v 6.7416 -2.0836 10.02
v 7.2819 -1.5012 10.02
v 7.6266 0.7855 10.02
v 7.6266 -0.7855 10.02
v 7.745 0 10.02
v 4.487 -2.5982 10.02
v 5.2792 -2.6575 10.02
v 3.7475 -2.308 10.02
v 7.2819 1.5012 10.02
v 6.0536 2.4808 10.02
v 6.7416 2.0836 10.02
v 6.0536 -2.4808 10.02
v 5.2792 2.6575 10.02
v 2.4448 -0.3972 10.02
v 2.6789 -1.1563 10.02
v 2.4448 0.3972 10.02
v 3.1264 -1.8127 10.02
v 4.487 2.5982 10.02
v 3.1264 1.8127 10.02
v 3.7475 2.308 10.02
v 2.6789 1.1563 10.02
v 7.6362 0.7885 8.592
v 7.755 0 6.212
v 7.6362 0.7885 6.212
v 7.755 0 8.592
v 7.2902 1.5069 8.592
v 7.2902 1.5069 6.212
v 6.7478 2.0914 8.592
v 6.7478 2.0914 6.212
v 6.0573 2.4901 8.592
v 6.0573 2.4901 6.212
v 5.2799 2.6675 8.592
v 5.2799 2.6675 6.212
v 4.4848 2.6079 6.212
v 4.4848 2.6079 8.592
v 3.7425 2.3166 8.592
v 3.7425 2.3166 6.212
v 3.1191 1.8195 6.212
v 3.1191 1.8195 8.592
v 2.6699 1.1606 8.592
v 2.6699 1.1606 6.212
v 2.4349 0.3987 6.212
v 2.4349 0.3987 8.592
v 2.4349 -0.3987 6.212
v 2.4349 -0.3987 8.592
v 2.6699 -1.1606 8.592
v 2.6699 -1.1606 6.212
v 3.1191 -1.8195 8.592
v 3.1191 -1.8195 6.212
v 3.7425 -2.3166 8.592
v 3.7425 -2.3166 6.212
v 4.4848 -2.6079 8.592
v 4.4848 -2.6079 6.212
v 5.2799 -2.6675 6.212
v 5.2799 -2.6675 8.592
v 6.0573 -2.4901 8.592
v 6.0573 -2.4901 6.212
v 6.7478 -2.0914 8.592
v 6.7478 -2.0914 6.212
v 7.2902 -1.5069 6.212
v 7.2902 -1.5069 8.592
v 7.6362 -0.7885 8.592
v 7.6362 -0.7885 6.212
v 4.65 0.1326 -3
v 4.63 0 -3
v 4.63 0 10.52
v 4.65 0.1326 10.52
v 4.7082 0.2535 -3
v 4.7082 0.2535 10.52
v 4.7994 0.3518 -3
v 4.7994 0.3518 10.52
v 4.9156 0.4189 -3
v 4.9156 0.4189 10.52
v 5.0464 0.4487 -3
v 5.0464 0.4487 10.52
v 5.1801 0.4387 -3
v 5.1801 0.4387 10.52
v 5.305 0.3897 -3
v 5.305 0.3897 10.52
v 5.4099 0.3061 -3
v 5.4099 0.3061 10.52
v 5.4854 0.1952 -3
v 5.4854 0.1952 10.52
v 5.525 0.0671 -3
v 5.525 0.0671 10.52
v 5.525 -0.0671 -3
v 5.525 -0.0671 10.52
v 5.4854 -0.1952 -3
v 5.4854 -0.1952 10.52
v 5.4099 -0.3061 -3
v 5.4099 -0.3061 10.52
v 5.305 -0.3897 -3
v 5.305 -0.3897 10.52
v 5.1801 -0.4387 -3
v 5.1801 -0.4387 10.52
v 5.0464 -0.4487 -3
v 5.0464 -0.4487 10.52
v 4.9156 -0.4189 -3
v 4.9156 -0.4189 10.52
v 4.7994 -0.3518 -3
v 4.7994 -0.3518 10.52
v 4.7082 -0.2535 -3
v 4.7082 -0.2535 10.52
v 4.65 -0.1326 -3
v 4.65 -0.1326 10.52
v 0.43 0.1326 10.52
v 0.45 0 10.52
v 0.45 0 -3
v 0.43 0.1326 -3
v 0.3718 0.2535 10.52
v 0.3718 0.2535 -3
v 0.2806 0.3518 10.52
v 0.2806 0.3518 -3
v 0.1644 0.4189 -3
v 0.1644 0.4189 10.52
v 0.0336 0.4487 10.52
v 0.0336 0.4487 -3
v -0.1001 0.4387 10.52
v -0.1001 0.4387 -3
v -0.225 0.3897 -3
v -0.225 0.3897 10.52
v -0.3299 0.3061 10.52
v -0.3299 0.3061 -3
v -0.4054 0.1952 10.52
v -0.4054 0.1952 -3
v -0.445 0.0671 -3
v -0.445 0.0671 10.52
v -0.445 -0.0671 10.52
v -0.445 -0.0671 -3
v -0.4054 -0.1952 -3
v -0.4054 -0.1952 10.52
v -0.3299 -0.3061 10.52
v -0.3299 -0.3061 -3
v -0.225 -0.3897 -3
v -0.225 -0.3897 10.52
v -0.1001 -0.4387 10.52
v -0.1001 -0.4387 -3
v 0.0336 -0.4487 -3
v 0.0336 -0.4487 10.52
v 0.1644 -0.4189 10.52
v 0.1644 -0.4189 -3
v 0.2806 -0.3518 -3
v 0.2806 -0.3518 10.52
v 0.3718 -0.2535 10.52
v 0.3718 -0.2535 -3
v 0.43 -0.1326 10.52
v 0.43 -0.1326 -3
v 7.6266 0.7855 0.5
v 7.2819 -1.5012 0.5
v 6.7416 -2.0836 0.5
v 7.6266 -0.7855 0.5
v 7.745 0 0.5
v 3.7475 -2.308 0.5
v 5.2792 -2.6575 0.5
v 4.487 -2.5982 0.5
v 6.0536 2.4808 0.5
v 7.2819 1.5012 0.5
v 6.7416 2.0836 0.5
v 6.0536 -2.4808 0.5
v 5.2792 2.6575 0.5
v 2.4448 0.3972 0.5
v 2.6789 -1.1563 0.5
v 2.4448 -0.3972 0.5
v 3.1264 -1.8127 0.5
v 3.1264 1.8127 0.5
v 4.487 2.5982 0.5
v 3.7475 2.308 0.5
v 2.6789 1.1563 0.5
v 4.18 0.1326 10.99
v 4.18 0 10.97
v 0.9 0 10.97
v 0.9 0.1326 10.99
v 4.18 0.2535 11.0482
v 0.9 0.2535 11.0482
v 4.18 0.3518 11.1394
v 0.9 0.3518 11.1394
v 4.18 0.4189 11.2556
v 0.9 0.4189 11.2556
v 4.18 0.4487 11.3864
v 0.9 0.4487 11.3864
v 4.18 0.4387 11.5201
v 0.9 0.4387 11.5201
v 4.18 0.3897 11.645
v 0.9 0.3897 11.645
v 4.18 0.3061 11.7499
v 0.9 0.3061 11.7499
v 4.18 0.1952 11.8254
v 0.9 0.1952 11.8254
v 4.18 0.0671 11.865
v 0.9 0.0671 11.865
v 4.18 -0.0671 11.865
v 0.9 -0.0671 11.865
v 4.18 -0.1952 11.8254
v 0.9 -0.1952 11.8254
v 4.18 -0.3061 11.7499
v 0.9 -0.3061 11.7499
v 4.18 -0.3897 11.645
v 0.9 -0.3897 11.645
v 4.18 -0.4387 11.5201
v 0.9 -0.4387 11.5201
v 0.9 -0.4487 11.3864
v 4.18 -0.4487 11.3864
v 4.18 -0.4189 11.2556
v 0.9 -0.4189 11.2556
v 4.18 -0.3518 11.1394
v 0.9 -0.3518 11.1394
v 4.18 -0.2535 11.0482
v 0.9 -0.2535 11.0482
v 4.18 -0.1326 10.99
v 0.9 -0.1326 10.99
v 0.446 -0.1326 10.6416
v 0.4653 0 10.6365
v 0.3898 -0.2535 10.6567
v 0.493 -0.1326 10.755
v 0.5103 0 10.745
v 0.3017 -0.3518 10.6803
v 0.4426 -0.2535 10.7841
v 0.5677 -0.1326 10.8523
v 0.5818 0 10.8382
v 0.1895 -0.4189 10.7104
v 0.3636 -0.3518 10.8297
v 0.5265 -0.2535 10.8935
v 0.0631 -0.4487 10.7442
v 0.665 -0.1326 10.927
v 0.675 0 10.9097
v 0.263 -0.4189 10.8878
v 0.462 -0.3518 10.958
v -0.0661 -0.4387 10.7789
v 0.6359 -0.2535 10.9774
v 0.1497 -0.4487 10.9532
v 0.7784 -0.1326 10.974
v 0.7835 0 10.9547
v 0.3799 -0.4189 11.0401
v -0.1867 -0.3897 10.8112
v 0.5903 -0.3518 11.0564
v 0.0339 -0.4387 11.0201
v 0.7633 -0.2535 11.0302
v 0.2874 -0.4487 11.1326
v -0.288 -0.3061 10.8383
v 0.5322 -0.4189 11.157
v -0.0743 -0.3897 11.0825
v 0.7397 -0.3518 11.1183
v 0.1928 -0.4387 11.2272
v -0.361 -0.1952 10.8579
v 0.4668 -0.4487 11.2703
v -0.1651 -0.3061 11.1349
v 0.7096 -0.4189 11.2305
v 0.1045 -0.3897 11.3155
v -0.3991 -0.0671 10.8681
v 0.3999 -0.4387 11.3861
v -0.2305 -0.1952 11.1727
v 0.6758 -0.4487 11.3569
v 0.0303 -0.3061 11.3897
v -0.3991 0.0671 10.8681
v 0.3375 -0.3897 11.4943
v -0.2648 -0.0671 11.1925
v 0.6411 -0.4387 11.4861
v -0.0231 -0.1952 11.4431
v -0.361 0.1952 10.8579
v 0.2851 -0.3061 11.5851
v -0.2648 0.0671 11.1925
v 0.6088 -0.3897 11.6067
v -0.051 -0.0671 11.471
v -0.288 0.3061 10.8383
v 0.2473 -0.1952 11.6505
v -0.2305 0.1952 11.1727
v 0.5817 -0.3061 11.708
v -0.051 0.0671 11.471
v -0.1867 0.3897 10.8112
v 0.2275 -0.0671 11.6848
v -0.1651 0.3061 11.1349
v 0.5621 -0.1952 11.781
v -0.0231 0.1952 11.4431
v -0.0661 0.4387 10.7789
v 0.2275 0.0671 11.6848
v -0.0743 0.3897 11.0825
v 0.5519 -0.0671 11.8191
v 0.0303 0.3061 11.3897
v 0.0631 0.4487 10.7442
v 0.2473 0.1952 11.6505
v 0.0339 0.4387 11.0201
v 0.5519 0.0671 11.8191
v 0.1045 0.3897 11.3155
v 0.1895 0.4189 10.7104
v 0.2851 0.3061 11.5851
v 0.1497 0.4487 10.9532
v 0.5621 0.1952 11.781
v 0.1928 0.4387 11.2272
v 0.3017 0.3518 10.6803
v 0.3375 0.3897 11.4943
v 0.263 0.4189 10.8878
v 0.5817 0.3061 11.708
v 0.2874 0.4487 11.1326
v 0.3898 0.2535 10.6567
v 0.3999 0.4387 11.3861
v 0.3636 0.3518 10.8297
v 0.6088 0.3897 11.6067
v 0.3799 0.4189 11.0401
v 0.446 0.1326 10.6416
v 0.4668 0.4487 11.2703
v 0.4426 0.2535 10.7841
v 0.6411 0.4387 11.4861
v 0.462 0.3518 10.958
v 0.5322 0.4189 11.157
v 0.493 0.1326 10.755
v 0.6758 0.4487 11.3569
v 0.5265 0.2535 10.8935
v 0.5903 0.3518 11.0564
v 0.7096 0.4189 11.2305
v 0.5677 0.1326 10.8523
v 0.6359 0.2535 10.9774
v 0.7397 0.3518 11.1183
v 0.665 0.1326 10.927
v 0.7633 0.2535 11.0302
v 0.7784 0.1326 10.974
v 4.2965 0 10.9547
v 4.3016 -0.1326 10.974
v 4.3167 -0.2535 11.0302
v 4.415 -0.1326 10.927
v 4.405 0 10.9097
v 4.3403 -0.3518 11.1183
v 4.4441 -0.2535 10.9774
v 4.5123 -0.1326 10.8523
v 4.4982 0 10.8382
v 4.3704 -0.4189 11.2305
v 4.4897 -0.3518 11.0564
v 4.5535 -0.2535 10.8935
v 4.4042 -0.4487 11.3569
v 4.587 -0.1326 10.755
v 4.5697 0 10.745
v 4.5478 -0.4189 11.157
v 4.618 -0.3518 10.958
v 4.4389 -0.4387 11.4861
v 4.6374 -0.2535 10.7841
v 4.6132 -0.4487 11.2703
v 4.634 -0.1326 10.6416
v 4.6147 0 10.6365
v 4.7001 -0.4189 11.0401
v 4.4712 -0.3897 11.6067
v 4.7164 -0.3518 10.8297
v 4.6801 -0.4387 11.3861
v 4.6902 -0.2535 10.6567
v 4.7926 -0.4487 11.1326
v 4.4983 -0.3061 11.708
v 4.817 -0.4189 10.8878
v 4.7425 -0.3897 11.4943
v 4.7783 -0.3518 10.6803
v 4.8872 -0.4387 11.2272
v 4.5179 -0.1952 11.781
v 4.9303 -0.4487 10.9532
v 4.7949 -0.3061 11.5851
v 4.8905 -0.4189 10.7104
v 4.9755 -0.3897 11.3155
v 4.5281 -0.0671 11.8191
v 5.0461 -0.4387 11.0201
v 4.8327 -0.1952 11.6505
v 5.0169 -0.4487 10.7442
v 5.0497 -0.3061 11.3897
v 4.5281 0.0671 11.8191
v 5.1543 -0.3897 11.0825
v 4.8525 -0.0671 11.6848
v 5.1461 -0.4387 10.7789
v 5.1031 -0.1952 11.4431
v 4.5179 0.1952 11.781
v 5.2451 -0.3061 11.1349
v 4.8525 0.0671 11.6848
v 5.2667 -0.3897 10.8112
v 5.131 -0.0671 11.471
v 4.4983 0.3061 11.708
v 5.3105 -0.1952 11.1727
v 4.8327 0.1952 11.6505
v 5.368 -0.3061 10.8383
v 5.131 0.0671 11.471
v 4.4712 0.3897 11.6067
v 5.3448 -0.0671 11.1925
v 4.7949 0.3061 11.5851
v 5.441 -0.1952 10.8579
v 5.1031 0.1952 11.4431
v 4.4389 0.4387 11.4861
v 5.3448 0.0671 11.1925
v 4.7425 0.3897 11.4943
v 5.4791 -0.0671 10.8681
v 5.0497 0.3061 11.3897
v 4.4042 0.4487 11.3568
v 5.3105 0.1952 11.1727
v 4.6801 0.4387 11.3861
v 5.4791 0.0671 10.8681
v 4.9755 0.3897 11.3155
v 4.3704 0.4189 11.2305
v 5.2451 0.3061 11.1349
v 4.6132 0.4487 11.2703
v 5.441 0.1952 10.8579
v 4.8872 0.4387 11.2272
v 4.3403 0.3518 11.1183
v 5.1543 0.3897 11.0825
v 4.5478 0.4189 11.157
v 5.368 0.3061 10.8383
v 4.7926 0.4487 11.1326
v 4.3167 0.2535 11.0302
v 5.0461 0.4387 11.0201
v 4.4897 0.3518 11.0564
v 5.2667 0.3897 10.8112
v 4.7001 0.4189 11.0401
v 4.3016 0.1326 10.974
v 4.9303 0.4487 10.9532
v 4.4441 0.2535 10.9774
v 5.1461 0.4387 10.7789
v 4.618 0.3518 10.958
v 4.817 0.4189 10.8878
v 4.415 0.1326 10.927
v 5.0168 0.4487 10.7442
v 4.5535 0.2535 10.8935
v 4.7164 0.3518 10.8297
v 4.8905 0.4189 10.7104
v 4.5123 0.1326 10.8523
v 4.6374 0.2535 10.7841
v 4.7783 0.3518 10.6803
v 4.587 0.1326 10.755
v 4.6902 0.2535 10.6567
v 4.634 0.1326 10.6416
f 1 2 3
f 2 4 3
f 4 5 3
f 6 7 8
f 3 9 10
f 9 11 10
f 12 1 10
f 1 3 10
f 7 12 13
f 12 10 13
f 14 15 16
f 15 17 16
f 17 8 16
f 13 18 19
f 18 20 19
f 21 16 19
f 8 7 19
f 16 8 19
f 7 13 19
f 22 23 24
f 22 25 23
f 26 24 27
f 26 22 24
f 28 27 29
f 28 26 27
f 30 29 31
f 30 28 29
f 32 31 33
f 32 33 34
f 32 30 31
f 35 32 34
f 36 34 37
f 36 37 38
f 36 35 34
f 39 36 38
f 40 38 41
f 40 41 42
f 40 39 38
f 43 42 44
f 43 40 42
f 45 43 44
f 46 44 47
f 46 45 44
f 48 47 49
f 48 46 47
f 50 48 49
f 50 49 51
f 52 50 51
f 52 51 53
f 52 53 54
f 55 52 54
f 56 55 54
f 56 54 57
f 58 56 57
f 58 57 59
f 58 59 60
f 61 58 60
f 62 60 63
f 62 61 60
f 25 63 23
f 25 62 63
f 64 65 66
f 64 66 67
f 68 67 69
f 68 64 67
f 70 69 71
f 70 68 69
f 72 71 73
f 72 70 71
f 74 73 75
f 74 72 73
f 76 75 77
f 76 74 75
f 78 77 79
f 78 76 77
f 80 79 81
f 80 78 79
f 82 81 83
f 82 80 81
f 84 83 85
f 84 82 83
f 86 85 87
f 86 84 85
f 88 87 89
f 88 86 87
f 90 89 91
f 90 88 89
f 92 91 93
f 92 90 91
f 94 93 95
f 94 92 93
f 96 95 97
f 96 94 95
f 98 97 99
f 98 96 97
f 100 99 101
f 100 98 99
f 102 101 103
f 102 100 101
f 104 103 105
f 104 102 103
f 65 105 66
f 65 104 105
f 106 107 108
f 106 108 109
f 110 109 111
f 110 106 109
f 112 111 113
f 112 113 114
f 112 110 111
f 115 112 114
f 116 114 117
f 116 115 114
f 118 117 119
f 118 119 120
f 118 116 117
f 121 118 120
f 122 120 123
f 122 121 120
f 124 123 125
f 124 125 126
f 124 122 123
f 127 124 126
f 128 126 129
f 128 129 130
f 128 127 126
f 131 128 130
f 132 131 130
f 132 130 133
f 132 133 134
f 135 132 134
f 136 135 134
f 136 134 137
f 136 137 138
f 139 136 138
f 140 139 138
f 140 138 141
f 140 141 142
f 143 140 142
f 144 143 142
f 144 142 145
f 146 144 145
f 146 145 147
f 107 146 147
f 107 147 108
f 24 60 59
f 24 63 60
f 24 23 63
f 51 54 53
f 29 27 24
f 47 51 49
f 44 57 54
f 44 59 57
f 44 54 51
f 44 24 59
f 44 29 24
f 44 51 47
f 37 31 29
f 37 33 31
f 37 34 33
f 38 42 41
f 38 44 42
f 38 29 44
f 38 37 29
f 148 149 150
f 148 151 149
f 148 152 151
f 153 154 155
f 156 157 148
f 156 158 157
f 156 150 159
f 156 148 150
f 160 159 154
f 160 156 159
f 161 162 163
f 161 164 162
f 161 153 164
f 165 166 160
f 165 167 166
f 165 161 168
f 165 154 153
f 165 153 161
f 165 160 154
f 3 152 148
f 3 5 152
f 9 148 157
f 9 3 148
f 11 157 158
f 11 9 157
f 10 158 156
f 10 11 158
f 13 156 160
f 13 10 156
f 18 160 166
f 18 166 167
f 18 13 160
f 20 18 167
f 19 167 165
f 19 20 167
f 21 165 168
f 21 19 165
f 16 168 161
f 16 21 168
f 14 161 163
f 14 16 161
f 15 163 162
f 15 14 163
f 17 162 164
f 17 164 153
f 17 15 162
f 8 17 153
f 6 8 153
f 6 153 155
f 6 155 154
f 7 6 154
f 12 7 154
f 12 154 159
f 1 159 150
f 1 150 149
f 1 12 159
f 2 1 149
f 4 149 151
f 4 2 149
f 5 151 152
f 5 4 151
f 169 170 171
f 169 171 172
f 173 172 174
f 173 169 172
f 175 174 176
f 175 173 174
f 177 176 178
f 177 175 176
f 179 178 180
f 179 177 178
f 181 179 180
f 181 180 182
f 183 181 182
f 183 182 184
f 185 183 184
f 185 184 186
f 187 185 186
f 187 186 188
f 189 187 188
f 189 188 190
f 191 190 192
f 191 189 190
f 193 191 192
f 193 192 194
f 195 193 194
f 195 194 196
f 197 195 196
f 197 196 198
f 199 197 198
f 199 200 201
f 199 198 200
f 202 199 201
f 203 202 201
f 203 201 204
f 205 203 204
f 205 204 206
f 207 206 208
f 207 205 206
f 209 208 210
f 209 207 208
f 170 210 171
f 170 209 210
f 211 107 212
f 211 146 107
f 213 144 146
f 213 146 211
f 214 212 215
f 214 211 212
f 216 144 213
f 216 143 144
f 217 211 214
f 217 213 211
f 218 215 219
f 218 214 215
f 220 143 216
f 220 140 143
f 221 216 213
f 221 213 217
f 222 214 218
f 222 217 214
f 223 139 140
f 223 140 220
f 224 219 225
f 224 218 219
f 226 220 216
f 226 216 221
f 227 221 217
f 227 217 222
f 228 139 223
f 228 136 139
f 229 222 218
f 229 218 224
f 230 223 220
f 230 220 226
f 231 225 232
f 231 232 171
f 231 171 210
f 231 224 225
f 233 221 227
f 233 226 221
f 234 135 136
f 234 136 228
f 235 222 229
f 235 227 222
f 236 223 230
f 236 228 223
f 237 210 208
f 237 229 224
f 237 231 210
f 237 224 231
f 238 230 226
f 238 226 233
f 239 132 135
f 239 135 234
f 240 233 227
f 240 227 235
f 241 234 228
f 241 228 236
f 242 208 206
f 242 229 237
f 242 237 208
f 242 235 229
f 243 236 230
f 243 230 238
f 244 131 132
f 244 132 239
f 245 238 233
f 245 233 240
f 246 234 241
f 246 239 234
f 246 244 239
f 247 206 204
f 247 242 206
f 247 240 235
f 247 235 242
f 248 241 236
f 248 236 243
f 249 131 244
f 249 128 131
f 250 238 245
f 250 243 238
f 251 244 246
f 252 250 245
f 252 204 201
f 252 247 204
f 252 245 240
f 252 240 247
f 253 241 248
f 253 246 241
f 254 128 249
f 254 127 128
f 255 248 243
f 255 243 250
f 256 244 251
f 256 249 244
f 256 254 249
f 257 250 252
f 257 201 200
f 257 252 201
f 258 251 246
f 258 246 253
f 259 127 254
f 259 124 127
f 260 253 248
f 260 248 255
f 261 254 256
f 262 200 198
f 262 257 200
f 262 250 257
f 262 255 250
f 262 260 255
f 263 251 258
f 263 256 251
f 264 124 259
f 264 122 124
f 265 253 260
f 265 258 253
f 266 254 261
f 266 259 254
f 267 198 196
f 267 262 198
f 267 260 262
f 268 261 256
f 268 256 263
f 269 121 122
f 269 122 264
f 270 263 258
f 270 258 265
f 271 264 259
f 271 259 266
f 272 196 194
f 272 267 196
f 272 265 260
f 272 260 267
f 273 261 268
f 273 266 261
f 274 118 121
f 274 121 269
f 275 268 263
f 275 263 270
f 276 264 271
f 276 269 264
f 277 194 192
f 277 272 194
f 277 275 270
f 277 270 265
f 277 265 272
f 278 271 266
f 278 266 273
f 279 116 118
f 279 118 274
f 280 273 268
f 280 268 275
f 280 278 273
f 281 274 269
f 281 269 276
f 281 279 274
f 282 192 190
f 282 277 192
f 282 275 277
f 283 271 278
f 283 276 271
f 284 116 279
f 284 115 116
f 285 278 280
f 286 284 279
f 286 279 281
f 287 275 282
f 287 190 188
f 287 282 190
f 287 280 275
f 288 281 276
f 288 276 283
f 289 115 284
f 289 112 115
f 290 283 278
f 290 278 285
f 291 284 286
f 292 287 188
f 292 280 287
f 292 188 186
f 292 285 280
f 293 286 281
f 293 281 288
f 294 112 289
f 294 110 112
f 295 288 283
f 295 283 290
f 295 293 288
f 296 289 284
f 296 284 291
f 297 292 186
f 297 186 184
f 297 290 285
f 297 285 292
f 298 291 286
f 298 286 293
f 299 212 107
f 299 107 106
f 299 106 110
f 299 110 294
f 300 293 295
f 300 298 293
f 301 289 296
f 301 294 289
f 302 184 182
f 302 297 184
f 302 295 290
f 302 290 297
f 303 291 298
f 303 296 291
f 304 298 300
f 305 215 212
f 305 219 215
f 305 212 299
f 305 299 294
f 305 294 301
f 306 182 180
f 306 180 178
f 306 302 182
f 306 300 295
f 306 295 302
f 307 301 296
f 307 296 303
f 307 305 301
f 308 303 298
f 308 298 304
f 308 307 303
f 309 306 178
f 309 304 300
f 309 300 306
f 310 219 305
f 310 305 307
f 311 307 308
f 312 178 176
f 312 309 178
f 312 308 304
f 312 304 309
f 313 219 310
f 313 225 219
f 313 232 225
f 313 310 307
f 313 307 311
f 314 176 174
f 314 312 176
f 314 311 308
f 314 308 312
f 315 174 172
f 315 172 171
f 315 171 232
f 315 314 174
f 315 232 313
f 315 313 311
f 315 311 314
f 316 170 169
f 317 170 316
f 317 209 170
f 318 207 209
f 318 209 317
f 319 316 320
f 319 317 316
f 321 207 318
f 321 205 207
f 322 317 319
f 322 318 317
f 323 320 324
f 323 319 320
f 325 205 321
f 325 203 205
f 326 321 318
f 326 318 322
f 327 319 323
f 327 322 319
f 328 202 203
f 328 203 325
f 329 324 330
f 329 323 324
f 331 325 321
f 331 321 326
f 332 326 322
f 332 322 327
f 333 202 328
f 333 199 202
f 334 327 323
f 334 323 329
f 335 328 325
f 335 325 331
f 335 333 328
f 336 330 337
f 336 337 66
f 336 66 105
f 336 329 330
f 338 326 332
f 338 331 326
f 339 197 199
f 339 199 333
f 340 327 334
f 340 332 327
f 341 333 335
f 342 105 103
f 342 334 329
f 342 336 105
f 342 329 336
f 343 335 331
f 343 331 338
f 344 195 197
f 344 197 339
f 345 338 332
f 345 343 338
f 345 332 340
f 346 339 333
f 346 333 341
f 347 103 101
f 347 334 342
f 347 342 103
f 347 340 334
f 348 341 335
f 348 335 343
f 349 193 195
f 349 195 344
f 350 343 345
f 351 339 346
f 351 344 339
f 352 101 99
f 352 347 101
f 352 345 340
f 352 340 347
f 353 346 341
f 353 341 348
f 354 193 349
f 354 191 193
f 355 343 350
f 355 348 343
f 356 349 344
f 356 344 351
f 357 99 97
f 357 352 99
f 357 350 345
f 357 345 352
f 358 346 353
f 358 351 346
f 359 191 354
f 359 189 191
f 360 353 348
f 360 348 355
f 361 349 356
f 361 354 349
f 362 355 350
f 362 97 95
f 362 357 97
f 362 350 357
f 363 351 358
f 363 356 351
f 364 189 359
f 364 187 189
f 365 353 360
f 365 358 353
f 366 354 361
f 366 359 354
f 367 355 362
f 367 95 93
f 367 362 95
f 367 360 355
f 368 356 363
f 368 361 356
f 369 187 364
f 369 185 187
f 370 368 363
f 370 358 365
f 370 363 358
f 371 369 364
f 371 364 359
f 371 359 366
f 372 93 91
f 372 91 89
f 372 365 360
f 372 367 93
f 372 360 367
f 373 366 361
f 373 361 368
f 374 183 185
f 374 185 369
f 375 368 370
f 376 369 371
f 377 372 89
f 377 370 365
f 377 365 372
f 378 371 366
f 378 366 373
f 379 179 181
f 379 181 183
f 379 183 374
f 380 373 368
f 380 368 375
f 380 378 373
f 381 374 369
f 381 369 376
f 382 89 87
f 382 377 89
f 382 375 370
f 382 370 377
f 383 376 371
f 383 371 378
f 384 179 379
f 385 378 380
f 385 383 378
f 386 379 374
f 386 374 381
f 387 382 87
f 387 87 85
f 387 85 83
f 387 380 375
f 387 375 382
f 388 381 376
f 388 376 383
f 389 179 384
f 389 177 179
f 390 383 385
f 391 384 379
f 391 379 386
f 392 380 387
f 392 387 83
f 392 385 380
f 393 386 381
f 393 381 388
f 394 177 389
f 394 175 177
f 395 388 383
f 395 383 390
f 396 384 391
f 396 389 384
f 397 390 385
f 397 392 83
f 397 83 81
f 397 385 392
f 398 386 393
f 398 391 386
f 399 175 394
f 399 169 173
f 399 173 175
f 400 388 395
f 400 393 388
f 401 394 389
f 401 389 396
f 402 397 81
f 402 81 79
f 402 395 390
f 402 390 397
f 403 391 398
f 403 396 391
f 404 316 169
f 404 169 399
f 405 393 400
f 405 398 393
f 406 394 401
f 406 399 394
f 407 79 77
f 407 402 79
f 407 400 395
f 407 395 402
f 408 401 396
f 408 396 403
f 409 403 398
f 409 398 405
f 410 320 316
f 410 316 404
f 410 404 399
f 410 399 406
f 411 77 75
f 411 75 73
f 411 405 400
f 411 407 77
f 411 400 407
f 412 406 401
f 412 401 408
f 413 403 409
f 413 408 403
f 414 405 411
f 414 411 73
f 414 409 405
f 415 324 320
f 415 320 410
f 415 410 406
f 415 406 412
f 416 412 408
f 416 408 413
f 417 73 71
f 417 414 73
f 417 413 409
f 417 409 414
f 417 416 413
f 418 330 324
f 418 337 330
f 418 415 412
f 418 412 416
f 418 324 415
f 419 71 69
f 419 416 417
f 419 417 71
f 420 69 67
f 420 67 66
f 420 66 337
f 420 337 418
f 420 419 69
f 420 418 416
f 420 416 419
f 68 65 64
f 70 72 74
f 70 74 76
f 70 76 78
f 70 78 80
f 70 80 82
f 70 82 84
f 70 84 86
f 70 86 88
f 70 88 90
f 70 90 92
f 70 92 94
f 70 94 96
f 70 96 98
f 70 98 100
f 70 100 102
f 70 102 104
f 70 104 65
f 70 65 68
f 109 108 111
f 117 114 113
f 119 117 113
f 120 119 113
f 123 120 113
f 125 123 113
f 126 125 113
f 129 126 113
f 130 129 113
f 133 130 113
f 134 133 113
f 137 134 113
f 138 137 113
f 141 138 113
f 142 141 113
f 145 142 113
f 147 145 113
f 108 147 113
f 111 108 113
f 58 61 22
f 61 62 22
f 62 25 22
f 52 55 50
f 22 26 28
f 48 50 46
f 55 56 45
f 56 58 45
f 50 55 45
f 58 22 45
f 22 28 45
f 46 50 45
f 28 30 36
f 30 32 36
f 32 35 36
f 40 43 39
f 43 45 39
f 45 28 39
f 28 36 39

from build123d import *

# Parameters (mm, degrees)
SKETCH001_R = 0.45
SKETCH002_W = 2.665
SKETCH002_H = 9.52
SKETCH003_W = 2.675
SKETCH003_H = 2.38


with BuildPart() as sweep_body:
    # Sweep: sweep along a path in Sketch
    with BuildLine(Plane.XZ) as sweep_path:
        Line((0, -3), (0, 10.52))
        ThreePointArc((0, 10.52), (0.263604, 11.156396), (0.9, 11.42))
        Line((0.9, 11.42), (4.18, 11.42))
        ThreePointArc((4.18, 11.42), (4.816396, 11.156396), (5.08, 10.52))
        Line((5.08, 10.52), (5.08, -3))
    # Sketch001 → Sweep (sweep)
    with BuildSketch(Plane.XY):
        Circle(SKETCH001_R)
    sweep(path=sweep_path.line)


with BuildPart() as revolution:
    # Sketch002 → Revolution (revolve)
    with BuildSketch(Plane.XZ):
        with Locations((6.4125, 5.26)):
            Rectangle(SKETCH002_W, SKETCH002_H)
    revolve(axis=Axis((5.08, 0, 0.5), (0, 0, 1)))


with BuildPart() as revolution001:
    # Sketch003 → Revolution001 (revolve)
    with BuildSketch(Plane.XZ):
        with Locations((6.4175, 7.402)):
            Rectangle(SKETCH003_W, SKETCH003_H)
    revolve(axis=Axis((5.08, 0, 6.212), (0, 0, 1)))


solid = Compound([sweep_body.part, revolution.part, revolution001.part])
